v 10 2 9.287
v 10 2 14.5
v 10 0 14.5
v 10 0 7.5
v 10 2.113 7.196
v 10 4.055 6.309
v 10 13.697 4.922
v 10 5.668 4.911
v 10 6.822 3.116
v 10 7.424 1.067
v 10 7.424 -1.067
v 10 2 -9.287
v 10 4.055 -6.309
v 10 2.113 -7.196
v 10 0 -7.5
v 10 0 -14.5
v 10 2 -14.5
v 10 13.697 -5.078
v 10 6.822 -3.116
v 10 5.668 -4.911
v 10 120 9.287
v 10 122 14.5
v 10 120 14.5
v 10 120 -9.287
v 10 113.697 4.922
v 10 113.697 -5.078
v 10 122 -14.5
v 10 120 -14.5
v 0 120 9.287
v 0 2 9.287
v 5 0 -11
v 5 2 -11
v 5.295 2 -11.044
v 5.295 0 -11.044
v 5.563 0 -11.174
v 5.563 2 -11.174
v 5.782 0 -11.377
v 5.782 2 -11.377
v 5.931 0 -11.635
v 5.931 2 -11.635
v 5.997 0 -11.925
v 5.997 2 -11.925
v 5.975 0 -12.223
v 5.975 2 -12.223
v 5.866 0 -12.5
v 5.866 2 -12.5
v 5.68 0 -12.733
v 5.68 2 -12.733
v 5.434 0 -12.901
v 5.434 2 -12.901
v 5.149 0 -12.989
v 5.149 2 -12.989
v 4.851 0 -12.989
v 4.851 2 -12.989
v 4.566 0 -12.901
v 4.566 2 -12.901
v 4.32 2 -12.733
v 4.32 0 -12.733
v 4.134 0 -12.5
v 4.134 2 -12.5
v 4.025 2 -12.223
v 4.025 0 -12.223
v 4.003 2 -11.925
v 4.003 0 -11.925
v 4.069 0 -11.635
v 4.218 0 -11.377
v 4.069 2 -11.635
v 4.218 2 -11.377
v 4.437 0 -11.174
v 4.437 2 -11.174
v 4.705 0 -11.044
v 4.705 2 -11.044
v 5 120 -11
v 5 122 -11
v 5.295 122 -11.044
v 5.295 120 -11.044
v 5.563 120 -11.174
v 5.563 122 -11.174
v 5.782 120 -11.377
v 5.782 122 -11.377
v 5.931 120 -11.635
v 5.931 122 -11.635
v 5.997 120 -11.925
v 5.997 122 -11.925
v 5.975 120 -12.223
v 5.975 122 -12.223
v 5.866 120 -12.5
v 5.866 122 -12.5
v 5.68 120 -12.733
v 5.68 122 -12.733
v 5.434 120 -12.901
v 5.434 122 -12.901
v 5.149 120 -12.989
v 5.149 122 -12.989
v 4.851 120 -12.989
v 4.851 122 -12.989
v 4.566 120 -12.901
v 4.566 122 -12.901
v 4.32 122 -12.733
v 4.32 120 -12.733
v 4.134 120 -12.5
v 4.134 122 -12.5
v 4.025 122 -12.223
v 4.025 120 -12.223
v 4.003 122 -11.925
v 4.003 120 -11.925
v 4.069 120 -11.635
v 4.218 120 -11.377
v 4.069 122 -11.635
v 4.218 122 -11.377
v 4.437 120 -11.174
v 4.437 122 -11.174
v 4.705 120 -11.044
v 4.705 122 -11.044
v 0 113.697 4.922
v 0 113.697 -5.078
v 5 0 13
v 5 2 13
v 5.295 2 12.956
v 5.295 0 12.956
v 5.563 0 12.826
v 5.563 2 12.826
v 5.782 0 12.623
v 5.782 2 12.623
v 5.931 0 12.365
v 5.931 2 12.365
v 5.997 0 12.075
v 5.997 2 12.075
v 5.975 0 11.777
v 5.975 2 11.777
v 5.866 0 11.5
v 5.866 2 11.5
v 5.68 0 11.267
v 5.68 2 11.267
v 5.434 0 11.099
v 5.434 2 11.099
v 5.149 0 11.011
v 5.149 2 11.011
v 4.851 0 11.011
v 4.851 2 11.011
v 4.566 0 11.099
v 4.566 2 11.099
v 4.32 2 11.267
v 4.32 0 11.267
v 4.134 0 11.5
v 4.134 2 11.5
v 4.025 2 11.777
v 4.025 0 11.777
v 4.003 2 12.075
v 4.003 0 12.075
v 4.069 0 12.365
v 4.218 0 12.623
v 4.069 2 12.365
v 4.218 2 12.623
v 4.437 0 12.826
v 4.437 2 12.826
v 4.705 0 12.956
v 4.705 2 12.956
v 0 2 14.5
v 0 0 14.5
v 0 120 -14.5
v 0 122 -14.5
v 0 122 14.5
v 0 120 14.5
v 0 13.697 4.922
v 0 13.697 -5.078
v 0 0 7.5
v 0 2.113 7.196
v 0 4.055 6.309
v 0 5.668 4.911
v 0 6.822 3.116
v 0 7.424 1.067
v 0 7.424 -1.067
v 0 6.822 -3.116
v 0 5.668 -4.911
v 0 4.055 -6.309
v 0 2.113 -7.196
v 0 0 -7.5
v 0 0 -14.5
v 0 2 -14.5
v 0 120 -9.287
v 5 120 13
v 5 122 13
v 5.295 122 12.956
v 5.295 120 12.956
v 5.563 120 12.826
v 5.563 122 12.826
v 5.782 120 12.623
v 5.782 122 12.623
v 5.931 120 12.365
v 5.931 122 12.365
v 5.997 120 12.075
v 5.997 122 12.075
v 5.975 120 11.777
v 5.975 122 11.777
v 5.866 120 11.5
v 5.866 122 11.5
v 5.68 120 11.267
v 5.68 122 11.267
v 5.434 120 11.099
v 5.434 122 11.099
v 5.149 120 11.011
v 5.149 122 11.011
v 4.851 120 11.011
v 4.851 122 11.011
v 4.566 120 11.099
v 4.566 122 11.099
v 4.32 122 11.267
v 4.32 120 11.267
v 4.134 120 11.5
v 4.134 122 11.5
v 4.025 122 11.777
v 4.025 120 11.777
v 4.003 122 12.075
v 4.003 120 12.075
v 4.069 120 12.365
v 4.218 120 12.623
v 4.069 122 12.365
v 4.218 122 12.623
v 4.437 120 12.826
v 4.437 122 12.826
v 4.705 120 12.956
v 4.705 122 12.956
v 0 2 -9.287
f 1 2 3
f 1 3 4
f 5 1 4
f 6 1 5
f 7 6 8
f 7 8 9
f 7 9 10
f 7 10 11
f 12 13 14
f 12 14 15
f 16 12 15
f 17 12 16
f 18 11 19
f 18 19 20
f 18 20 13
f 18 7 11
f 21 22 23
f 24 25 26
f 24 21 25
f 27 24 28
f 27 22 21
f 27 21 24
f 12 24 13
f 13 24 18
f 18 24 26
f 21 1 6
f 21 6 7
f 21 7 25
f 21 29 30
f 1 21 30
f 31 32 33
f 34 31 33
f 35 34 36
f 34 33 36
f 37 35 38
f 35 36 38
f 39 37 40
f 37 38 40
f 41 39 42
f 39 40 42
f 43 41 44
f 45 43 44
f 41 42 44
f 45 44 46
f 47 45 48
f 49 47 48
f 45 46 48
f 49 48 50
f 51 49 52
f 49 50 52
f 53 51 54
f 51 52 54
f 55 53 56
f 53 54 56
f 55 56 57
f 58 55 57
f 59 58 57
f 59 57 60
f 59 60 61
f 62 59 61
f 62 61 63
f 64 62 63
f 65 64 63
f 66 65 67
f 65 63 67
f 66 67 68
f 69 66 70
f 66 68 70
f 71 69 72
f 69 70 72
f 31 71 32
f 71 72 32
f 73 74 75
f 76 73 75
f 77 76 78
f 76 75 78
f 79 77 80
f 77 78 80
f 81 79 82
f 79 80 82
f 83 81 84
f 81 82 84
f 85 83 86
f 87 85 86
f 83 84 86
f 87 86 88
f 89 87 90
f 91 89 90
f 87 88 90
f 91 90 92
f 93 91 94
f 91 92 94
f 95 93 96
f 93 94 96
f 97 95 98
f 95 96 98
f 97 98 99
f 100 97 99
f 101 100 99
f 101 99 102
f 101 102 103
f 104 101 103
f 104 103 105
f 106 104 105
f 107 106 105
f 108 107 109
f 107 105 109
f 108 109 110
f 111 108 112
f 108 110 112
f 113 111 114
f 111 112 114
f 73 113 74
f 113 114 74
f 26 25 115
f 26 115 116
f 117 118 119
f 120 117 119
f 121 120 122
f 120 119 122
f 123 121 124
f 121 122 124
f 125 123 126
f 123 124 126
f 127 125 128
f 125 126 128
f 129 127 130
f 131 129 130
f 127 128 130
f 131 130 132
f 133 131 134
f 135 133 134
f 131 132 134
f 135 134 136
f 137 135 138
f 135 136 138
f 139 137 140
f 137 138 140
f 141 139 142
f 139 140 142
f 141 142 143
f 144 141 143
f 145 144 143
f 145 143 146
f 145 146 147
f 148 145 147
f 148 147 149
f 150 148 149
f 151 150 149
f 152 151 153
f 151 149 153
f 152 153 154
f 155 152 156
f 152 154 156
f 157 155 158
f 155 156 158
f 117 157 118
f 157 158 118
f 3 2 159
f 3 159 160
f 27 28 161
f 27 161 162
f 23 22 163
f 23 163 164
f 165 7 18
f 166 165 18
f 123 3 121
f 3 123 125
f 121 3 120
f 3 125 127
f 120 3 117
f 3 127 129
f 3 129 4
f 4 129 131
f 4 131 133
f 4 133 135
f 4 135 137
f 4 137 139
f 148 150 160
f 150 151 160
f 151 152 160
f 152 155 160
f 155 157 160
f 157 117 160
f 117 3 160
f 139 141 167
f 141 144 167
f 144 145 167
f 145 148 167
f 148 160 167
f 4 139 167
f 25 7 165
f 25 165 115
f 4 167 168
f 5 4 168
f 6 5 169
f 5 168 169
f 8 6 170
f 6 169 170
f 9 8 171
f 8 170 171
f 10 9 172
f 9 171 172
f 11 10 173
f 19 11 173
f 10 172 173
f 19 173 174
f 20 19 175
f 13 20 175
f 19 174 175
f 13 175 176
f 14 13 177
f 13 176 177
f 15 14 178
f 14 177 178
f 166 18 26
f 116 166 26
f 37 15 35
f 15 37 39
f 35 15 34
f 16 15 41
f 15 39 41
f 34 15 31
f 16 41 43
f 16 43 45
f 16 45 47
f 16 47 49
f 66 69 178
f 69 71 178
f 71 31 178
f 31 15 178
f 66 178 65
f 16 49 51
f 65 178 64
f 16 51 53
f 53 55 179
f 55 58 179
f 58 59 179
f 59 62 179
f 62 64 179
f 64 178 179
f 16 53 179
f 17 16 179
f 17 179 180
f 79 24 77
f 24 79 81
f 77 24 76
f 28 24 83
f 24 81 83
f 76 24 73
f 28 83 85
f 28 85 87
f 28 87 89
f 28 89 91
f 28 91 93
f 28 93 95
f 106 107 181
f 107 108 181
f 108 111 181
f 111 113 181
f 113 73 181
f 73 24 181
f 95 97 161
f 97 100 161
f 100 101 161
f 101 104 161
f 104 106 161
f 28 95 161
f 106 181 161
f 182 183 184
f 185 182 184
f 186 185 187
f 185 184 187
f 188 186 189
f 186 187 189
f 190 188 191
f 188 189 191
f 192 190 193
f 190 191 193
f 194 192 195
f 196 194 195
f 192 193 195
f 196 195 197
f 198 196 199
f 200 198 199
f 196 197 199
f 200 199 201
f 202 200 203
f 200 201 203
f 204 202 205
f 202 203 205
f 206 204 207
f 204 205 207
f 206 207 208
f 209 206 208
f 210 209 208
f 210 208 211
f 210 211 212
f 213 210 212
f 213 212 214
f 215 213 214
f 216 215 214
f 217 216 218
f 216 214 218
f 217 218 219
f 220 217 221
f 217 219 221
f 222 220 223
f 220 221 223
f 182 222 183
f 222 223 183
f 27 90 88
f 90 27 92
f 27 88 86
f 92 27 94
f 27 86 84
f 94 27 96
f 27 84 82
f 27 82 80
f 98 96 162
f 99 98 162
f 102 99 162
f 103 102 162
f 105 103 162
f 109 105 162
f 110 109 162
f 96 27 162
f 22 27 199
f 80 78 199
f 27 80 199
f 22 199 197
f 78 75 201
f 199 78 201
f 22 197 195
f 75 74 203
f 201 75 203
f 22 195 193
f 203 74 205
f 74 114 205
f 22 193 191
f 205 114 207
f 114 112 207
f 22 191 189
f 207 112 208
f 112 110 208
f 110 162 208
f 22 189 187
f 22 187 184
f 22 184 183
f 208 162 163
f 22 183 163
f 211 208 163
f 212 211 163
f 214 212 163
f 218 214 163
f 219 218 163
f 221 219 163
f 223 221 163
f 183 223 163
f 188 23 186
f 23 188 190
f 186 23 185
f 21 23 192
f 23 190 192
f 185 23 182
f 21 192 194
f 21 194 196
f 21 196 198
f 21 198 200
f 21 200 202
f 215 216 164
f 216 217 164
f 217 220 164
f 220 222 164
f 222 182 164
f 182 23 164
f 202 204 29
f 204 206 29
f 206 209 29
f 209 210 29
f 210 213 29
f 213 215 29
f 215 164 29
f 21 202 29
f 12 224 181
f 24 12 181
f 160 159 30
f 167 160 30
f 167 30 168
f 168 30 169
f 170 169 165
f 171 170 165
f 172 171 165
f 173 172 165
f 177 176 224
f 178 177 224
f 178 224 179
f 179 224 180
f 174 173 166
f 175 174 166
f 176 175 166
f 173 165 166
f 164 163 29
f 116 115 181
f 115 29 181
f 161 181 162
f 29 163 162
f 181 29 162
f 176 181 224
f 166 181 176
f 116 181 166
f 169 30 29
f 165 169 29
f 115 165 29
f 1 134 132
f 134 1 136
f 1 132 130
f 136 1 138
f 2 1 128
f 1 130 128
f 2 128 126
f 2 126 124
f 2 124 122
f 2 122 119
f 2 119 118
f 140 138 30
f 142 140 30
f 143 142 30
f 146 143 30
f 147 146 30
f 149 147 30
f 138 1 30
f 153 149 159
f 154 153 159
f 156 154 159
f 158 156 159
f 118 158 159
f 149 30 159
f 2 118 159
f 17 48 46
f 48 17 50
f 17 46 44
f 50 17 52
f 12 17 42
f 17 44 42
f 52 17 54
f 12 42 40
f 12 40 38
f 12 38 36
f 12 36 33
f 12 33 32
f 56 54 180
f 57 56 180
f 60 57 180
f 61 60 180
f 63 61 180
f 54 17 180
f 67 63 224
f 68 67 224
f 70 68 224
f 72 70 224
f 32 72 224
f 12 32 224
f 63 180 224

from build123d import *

# Parameters (mm, degrees)
BOSS_EXTRUDE3_DEPTH = 10
SKETCH8_W           = 10
SKETCH8_H           = 100
CUT_EXTRUDE1_DEPTH  = 10
SKETCH9_R           = 1
CUT_EXTRUDE2_DEPTH  = 2
SKETCH11_R          = 1
CUT_EXTRUDE3_DEPTH  = 2
LPATTERN1_COUNT     = 2
LPATTERN1_PITCH     = 120


with BuildPart() as part:
    # Sketch1 → Boss-Extrude3 (new body)
    with BuildSketch(Plane(origin=(0, 0, 0), x_dir=(0, 0, -1), z_dir=(1, 0, 0))):
        with BuildLine():
            Line((7.5, 0), (14.5, 0))
            Line((14.5, 0), (14.5, 2))
            Line((14.5, 2), (9.287087811, 2))
            Line((9.287087811, 2), (9.287087811, 120))
            Line((9.287087811, 120), (14.5, 120))
            Line((14.5, 120), (14.5, 122))
            Line((14.5, 122), (9.287087811, 122))
            Line((9.287087811, 122), (-9.287087811, 122))
            Line((-9.287087811, 122), (-14.5, 122))
            Line((-14.5, 122), (-14.5, 120))
            Line((-14.5, 120), (-9.287087811, 120))
            Line((-9.287087811, 120), (-9.287087811, 2))
            Line((-9.287087811, 2), (-14.5, 2))
            Line((-14.5, 2), (-14.5, 0))
            Line((-14.5, 0), (-7.5, 0))
            ThreePointArc((-7.5, 0), (0, 7.5), (7.5, 0))
        make_face()
    extrude(amount=BOSS_EXTRUDE3_DEPTH)

    # Sketch8 → Cut-Extrude1 (cut)
    with BuildSketch(Plane(origin=(10, 0, 0), x_dir=(0, 0, -1), z_dir=(1, 0, 0))):
        with Locations((0.077954642, 63.696555082)):
            Rectangle(SKETCH8_W, SKETCH8_H)
    extrude(amount=-CUT_EXTRUDE1_DEPTH, mode=Mode.SUBTRACT)

    # Sketch9 → Cut-Extrude2 (cut)
    with BuildSketch(Plane(origin=(0, 2, 0), x_dir=(1, 0, 0), z_dir=(0, 1, 0))):
        with Locations(Location((5, 12, 0), (0, 0, 270))):
            Circle(SKETCH9_R)
    cut_extrude2 = extrude(amount=-CUT_EXTRUDE2_DEPTH, mode=Mode.SUBTRACT)

    # Sketch11 → Cut-Extrude3 (cut)
    with BuildSketch(Plane(origin=(0, 2, 0), x_dir=(1, 0, 0), z_dir=(0, 1, 0))):
        with Locations(Location((5, -12, 0), (0, 0, 270))):
            Circle(SKETCH11_R)
    cut_extrude3 = extrude(amount=-CUT_EXTRUDE3_DEPTH, mode=Mode.SUBTRACT)

    # LPattern1: Cut-Extrude2, Cut-Extrude3 ×2
    with Locations(*[(0, i * LPATTERN1_PITCH, 0) for i in range(1, LPATTERN1_COUNT)]):
        add(cut_extrude2, mode=Mode.SUBTRACT)
        add(cut_extrude3, mode=Mode.SUBTRACT)


solid = part.part
